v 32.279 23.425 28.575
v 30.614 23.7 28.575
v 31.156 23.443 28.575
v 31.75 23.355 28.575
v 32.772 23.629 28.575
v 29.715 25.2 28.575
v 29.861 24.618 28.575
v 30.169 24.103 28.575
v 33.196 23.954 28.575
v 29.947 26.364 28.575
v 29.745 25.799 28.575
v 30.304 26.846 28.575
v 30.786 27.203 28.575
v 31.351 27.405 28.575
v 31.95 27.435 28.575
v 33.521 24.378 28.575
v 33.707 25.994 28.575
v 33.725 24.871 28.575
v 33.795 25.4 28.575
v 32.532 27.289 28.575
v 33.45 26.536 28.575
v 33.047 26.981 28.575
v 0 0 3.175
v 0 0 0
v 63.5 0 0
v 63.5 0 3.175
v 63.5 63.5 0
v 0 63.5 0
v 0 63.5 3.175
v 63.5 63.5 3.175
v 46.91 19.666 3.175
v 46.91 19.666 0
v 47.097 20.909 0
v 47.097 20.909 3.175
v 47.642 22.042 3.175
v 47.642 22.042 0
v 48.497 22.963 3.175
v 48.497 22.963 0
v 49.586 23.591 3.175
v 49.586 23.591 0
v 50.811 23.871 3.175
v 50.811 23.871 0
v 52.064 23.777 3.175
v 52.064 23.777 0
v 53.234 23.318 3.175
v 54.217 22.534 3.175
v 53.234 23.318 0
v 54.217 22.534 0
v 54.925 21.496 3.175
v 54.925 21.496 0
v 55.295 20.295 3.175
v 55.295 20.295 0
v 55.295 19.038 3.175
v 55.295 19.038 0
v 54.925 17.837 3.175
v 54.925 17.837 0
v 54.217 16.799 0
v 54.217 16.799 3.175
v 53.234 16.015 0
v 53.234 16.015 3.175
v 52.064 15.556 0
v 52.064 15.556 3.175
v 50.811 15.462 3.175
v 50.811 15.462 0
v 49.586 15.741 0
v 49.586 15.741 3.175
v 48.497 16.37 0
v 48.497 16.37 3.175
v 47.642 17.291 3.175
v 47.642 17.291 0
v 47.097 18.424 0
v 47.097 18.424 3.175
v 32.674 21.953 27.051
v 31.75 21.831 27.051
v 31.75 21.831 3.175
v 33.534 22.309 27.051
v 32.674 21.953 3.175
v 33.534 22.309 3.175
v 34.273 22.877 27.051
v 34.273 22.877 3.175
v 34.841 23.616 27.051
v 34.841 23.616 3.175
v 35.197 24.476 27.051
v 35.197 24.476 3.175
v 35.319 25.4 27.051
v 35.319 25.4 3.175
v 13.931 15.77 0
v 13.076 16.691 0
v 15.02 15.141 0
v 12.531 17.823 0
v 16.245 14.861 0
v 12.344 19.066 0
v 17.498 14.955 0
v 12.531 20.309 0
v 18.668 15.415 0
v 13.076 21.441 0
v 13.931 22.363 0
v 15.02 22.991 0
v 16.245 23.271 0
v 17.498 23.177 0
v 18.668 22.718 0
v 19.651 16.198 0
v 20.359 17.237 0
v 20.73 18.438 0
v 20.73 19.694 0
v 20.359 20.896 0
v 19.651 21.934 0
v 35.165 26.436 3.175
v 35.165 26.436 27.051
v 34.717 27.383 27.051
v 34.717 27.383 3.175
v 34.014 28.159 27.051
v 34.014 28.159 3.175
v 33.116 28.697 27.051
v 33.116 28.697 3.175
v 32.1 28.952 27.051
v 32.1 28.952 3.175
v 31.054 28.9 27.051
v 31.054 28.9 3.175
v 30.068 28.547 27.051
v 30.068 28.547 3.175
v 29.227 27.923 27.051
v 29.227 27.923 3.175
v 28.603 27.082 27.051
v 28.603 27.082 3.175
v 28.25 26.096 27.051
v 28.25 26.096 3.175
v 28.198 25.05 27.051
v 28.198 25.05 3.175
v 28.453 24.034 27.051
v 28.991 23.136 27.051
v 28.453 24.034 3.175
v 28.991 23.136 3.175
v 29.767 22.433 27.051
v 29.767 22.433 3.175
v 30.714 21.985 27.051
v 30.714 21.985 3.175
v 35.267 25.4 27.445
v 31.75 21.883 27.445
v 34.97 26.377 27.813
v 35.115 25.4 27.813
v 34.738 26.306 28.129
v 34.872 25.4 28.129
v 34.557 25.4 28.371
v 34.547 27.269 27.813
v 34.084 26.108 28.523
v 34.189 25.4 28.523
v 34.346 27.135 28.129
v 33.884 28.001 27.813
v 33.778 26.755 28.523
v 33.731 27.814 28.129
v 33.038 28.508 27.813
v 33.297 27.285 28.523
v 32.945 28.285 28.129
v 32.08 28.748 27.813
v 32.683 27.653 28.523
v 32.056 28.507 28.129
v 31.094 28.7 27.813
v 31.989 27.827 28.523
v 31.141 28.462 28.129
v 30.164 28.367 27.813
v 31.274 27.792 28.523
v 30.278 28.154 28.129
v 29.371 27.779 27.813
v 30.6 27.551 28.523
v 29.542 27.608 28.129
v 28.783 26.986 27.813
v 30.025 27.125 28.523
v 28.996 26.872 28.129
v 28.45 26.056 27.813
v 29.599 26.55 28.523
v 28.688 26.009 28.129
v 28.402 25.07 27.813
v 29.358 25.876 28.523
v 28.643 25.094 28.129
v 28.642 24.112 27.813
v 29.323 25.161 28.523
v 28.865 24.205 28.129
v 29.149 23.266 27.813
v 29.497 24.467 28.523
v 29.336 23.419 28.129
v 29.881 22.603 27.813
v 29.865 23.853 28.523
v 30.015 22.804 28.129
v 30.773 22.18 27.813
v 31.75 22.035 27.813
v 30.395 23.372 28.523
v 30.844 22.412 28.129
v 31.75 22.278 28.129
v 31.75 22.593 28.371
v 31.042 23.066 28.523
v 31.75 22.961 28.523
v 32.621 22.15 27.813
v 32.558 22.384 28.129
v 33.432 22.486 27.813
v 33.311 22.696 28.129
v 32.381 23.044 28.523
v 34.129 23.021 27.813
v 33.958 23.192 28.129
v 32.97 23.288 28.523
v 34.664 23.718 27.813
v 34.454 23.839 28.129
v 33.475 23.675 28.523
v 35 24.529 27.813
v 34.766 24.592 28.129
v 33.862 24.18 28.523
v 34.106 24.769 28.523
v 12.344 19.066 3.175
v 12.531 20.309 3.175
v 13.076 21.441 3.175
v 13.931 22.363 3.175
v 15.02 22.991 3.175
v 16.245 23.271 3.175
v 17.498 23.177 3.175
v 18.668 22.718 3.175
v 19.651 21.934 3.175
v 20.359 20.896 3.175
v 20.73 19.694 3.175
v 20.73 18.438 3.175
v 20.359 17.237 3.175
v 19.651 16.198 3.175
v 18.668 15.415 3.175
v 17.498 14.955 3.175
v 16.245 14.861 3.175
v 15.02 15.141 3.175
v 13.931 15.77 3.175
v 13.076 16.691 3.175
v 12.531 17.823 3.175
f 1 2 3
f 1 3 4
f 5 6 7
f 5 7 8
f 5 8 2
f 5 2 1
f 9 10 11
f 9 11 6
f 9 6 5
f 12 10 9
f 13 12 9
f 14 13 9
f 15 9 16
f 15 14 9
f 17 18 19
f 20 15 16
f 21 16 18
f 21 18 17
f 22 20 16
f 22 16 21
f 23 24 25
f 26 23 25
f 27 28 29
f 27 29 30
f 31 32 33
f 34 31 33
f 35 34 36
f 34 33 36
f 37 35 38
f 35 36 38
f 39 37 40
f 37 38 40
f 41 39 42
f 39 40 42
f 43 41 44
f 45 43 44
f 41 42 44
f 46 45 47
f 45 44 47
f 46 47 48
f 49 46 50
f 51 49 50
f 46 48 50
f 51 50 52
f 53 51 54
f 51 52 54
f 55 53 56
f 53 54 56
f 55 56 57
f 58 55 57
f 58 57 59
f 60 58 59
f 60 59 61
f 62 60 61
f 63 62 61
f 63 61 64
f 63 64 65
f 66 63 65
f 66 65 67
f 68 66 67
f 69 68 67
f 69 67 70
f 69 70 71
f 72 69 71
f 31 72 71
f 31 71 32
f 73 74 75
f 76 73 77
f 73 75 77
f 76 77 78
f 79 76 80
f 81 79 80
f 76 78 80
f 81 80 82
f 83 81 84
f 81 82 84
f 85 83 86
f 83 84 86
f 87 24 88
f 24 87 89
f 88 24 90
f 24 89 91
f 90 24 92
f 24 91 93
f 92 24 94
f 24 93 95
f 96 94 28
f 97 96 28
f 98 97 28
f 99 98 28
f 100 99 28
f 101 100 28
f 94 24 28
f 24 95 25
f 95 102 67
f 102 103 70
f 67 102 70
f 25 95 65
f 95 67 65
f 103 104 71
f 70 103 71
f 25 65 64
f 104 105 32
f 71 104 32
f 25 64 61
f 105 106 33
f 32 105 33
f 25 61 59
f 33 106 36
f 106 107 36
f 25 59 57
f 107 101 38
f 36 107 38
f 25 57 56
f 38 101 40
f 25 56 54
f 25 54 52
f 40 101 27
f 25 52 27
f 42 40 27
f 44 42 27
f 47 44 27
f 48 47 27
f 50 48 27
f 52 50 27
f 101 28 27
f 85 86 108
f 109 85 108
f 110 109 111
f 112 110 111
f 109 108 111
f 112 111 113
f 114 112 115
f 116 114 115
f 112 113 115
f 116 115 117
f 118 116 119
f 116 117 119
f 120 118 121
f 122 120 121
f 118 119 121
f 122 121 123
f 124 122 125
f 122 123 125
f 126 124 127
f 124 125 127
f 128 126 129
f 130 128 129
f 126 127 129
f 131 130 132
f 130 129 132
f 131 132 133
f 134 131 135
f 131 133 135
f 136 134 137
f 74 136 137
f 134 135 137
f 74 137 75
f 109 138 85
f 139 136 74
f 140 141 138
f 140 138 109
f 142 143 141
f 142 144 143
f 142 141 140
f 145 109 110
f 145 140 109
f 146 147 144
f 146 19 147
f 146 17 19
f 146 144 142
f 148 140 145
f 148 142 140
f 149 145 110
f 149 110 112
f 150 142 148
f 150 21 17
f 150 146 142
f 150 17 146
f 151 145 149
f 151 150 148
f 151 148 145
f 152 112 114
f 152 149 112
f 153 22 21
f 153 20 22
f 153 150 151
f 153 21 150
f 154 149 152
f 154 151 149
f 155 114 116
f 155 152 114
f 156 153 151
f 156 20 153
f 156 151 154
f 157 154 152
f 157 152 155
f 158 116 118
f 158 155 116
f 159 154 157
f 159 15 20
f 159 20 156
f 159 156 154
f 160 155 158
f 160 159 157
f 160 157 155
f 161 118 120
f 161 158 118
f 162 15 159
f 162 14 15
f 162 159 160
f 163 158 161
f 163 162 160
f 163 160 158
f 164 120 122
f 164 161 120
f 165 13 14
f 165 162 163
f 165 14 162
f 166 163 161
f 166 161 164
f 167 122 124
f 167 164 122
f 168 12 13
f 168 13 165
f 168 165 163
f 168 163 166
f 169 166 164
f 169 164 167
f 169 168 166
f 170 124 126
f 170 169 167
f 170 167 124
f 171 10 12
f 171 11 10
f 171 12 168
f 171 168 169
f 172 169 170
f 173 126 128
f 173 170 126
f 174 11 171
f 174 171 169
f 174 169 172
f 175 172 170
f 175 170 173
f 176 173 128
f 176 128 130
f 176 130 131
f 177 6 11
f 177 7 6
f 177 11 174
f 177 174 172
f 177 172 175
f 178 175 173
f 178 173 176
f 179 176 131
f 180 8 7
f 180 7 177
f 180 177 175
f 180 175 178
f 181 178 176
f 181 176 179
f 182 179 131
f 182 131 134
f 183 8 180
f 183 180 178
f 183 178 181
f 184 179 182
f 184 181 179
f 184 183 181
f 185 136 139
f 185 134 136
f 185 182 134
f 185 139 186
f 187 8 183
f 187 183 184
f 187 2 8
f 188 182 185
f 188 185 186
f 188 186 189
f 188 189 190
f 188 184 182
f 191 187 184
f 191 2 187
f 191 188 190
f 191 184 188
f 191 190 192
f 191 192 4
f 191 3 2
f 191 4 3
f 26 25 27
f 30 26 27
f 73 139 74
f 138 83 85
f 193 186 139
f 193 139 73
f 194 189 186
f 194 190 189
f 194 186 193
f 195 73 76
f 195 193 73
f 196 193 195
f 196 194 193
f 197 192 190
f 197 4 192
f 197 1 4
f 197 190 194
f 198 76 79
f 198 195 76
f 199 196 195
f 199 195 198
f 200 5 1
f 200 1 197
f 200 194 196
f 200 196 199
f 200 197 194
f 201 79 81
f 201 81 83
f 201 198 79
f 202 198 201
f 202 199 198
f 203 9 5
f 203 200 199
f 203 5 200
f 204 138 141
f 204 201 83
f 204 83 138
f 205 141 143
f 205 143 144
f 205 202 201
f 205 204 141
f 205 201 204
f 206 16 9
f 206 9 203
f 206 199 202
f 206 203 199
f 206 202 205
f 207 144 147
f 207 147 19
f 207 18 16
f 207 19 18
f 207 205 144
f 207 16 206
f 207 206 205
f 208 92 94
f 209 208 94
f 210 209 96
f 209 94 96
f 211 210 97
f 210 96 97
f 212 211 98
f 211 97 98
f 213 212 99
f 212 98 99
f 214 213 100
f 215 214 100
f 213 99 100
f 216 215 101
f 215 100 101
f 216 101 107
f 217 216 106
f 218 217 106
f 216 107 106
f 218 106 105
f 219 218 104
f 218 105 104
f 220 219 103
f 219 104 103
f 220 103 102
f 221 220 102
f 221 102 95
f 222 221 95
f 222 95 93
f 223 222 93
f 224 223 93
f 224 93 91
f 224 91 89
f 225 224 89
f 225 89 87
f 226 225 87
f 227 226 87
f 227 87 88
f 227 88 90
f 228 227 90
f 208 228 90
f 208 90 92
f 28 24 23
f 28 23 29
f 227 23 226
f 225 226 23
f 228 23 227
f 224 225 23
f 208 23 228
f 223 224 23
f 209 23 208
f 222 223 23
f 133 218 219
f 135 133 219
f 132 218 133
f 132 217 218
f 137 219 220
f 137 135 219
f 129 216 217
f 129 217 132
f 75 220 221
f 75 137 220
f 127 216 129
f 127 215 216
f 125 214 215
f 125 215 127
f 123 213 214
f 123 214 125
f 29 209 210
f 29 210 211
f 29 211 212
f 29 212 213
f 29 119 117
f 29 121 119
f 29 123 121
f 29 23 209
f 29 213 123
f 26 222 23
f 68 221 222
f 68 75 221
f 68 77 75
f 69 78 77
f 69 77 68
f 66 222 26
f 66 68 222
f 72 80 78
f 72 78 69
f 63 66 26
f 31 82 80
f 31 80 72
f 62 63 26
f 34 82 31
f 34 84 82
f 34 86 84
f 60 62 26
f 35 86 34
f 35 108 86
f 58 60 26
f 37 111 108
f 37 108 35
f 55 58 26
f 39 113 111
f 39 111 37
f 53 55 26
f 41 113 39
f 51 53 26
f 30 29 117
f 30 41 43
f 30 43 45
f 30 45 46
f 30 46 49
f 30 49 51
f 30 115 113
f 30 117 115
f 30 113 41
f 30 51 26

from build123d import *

# Parameters (mm, degrees)
F0_W     = 63.5
F0_H     = 63.5
F1_DEPTH = 3.175
F3_DEPTH = 25.4
F4_R     = 1.524
F6_D     = 8.4328


with BuildPart() as f1:
    # F0 (on Top) → F1 (new body)
    with BuildSketch(Plane.XY):
        with Locations((31.75, 31.75)):
            Rectangle(F0_W, F0_H)
    extrude(amount=F1_DEPTH)

    # F2 (on face) → F3 (join)
    with BuildSketch(Plane.XY.offset(3.175)):
        with BuildLine():
            ThreePointArc((31.75, 21.8313), (34.27345197, 22.87654803), (35.3187, 25.4))
            ThreePointArc((35.3187, 25.4), (29.22654803, 27.92345197), (31.75, 21.8313))
        make_face()
    extrude(amount=F3_DEPTH)

    # F4
    f4_edges = [f1.edges().sort_by_distance(p)[0] for p in [
        (31.75, 28.9687, 28.575),
    ]]
    fillet(f4_edges, radius=F4_R)

    # F6 (through all)
    with Locations(Plane.XY.offset(3.175)):
        with Locations((16.5602006018, 19.0660767257), (51.1259697378, 19.6664221585)):
            Hole(F6_D / 2)


solid = f1.part
